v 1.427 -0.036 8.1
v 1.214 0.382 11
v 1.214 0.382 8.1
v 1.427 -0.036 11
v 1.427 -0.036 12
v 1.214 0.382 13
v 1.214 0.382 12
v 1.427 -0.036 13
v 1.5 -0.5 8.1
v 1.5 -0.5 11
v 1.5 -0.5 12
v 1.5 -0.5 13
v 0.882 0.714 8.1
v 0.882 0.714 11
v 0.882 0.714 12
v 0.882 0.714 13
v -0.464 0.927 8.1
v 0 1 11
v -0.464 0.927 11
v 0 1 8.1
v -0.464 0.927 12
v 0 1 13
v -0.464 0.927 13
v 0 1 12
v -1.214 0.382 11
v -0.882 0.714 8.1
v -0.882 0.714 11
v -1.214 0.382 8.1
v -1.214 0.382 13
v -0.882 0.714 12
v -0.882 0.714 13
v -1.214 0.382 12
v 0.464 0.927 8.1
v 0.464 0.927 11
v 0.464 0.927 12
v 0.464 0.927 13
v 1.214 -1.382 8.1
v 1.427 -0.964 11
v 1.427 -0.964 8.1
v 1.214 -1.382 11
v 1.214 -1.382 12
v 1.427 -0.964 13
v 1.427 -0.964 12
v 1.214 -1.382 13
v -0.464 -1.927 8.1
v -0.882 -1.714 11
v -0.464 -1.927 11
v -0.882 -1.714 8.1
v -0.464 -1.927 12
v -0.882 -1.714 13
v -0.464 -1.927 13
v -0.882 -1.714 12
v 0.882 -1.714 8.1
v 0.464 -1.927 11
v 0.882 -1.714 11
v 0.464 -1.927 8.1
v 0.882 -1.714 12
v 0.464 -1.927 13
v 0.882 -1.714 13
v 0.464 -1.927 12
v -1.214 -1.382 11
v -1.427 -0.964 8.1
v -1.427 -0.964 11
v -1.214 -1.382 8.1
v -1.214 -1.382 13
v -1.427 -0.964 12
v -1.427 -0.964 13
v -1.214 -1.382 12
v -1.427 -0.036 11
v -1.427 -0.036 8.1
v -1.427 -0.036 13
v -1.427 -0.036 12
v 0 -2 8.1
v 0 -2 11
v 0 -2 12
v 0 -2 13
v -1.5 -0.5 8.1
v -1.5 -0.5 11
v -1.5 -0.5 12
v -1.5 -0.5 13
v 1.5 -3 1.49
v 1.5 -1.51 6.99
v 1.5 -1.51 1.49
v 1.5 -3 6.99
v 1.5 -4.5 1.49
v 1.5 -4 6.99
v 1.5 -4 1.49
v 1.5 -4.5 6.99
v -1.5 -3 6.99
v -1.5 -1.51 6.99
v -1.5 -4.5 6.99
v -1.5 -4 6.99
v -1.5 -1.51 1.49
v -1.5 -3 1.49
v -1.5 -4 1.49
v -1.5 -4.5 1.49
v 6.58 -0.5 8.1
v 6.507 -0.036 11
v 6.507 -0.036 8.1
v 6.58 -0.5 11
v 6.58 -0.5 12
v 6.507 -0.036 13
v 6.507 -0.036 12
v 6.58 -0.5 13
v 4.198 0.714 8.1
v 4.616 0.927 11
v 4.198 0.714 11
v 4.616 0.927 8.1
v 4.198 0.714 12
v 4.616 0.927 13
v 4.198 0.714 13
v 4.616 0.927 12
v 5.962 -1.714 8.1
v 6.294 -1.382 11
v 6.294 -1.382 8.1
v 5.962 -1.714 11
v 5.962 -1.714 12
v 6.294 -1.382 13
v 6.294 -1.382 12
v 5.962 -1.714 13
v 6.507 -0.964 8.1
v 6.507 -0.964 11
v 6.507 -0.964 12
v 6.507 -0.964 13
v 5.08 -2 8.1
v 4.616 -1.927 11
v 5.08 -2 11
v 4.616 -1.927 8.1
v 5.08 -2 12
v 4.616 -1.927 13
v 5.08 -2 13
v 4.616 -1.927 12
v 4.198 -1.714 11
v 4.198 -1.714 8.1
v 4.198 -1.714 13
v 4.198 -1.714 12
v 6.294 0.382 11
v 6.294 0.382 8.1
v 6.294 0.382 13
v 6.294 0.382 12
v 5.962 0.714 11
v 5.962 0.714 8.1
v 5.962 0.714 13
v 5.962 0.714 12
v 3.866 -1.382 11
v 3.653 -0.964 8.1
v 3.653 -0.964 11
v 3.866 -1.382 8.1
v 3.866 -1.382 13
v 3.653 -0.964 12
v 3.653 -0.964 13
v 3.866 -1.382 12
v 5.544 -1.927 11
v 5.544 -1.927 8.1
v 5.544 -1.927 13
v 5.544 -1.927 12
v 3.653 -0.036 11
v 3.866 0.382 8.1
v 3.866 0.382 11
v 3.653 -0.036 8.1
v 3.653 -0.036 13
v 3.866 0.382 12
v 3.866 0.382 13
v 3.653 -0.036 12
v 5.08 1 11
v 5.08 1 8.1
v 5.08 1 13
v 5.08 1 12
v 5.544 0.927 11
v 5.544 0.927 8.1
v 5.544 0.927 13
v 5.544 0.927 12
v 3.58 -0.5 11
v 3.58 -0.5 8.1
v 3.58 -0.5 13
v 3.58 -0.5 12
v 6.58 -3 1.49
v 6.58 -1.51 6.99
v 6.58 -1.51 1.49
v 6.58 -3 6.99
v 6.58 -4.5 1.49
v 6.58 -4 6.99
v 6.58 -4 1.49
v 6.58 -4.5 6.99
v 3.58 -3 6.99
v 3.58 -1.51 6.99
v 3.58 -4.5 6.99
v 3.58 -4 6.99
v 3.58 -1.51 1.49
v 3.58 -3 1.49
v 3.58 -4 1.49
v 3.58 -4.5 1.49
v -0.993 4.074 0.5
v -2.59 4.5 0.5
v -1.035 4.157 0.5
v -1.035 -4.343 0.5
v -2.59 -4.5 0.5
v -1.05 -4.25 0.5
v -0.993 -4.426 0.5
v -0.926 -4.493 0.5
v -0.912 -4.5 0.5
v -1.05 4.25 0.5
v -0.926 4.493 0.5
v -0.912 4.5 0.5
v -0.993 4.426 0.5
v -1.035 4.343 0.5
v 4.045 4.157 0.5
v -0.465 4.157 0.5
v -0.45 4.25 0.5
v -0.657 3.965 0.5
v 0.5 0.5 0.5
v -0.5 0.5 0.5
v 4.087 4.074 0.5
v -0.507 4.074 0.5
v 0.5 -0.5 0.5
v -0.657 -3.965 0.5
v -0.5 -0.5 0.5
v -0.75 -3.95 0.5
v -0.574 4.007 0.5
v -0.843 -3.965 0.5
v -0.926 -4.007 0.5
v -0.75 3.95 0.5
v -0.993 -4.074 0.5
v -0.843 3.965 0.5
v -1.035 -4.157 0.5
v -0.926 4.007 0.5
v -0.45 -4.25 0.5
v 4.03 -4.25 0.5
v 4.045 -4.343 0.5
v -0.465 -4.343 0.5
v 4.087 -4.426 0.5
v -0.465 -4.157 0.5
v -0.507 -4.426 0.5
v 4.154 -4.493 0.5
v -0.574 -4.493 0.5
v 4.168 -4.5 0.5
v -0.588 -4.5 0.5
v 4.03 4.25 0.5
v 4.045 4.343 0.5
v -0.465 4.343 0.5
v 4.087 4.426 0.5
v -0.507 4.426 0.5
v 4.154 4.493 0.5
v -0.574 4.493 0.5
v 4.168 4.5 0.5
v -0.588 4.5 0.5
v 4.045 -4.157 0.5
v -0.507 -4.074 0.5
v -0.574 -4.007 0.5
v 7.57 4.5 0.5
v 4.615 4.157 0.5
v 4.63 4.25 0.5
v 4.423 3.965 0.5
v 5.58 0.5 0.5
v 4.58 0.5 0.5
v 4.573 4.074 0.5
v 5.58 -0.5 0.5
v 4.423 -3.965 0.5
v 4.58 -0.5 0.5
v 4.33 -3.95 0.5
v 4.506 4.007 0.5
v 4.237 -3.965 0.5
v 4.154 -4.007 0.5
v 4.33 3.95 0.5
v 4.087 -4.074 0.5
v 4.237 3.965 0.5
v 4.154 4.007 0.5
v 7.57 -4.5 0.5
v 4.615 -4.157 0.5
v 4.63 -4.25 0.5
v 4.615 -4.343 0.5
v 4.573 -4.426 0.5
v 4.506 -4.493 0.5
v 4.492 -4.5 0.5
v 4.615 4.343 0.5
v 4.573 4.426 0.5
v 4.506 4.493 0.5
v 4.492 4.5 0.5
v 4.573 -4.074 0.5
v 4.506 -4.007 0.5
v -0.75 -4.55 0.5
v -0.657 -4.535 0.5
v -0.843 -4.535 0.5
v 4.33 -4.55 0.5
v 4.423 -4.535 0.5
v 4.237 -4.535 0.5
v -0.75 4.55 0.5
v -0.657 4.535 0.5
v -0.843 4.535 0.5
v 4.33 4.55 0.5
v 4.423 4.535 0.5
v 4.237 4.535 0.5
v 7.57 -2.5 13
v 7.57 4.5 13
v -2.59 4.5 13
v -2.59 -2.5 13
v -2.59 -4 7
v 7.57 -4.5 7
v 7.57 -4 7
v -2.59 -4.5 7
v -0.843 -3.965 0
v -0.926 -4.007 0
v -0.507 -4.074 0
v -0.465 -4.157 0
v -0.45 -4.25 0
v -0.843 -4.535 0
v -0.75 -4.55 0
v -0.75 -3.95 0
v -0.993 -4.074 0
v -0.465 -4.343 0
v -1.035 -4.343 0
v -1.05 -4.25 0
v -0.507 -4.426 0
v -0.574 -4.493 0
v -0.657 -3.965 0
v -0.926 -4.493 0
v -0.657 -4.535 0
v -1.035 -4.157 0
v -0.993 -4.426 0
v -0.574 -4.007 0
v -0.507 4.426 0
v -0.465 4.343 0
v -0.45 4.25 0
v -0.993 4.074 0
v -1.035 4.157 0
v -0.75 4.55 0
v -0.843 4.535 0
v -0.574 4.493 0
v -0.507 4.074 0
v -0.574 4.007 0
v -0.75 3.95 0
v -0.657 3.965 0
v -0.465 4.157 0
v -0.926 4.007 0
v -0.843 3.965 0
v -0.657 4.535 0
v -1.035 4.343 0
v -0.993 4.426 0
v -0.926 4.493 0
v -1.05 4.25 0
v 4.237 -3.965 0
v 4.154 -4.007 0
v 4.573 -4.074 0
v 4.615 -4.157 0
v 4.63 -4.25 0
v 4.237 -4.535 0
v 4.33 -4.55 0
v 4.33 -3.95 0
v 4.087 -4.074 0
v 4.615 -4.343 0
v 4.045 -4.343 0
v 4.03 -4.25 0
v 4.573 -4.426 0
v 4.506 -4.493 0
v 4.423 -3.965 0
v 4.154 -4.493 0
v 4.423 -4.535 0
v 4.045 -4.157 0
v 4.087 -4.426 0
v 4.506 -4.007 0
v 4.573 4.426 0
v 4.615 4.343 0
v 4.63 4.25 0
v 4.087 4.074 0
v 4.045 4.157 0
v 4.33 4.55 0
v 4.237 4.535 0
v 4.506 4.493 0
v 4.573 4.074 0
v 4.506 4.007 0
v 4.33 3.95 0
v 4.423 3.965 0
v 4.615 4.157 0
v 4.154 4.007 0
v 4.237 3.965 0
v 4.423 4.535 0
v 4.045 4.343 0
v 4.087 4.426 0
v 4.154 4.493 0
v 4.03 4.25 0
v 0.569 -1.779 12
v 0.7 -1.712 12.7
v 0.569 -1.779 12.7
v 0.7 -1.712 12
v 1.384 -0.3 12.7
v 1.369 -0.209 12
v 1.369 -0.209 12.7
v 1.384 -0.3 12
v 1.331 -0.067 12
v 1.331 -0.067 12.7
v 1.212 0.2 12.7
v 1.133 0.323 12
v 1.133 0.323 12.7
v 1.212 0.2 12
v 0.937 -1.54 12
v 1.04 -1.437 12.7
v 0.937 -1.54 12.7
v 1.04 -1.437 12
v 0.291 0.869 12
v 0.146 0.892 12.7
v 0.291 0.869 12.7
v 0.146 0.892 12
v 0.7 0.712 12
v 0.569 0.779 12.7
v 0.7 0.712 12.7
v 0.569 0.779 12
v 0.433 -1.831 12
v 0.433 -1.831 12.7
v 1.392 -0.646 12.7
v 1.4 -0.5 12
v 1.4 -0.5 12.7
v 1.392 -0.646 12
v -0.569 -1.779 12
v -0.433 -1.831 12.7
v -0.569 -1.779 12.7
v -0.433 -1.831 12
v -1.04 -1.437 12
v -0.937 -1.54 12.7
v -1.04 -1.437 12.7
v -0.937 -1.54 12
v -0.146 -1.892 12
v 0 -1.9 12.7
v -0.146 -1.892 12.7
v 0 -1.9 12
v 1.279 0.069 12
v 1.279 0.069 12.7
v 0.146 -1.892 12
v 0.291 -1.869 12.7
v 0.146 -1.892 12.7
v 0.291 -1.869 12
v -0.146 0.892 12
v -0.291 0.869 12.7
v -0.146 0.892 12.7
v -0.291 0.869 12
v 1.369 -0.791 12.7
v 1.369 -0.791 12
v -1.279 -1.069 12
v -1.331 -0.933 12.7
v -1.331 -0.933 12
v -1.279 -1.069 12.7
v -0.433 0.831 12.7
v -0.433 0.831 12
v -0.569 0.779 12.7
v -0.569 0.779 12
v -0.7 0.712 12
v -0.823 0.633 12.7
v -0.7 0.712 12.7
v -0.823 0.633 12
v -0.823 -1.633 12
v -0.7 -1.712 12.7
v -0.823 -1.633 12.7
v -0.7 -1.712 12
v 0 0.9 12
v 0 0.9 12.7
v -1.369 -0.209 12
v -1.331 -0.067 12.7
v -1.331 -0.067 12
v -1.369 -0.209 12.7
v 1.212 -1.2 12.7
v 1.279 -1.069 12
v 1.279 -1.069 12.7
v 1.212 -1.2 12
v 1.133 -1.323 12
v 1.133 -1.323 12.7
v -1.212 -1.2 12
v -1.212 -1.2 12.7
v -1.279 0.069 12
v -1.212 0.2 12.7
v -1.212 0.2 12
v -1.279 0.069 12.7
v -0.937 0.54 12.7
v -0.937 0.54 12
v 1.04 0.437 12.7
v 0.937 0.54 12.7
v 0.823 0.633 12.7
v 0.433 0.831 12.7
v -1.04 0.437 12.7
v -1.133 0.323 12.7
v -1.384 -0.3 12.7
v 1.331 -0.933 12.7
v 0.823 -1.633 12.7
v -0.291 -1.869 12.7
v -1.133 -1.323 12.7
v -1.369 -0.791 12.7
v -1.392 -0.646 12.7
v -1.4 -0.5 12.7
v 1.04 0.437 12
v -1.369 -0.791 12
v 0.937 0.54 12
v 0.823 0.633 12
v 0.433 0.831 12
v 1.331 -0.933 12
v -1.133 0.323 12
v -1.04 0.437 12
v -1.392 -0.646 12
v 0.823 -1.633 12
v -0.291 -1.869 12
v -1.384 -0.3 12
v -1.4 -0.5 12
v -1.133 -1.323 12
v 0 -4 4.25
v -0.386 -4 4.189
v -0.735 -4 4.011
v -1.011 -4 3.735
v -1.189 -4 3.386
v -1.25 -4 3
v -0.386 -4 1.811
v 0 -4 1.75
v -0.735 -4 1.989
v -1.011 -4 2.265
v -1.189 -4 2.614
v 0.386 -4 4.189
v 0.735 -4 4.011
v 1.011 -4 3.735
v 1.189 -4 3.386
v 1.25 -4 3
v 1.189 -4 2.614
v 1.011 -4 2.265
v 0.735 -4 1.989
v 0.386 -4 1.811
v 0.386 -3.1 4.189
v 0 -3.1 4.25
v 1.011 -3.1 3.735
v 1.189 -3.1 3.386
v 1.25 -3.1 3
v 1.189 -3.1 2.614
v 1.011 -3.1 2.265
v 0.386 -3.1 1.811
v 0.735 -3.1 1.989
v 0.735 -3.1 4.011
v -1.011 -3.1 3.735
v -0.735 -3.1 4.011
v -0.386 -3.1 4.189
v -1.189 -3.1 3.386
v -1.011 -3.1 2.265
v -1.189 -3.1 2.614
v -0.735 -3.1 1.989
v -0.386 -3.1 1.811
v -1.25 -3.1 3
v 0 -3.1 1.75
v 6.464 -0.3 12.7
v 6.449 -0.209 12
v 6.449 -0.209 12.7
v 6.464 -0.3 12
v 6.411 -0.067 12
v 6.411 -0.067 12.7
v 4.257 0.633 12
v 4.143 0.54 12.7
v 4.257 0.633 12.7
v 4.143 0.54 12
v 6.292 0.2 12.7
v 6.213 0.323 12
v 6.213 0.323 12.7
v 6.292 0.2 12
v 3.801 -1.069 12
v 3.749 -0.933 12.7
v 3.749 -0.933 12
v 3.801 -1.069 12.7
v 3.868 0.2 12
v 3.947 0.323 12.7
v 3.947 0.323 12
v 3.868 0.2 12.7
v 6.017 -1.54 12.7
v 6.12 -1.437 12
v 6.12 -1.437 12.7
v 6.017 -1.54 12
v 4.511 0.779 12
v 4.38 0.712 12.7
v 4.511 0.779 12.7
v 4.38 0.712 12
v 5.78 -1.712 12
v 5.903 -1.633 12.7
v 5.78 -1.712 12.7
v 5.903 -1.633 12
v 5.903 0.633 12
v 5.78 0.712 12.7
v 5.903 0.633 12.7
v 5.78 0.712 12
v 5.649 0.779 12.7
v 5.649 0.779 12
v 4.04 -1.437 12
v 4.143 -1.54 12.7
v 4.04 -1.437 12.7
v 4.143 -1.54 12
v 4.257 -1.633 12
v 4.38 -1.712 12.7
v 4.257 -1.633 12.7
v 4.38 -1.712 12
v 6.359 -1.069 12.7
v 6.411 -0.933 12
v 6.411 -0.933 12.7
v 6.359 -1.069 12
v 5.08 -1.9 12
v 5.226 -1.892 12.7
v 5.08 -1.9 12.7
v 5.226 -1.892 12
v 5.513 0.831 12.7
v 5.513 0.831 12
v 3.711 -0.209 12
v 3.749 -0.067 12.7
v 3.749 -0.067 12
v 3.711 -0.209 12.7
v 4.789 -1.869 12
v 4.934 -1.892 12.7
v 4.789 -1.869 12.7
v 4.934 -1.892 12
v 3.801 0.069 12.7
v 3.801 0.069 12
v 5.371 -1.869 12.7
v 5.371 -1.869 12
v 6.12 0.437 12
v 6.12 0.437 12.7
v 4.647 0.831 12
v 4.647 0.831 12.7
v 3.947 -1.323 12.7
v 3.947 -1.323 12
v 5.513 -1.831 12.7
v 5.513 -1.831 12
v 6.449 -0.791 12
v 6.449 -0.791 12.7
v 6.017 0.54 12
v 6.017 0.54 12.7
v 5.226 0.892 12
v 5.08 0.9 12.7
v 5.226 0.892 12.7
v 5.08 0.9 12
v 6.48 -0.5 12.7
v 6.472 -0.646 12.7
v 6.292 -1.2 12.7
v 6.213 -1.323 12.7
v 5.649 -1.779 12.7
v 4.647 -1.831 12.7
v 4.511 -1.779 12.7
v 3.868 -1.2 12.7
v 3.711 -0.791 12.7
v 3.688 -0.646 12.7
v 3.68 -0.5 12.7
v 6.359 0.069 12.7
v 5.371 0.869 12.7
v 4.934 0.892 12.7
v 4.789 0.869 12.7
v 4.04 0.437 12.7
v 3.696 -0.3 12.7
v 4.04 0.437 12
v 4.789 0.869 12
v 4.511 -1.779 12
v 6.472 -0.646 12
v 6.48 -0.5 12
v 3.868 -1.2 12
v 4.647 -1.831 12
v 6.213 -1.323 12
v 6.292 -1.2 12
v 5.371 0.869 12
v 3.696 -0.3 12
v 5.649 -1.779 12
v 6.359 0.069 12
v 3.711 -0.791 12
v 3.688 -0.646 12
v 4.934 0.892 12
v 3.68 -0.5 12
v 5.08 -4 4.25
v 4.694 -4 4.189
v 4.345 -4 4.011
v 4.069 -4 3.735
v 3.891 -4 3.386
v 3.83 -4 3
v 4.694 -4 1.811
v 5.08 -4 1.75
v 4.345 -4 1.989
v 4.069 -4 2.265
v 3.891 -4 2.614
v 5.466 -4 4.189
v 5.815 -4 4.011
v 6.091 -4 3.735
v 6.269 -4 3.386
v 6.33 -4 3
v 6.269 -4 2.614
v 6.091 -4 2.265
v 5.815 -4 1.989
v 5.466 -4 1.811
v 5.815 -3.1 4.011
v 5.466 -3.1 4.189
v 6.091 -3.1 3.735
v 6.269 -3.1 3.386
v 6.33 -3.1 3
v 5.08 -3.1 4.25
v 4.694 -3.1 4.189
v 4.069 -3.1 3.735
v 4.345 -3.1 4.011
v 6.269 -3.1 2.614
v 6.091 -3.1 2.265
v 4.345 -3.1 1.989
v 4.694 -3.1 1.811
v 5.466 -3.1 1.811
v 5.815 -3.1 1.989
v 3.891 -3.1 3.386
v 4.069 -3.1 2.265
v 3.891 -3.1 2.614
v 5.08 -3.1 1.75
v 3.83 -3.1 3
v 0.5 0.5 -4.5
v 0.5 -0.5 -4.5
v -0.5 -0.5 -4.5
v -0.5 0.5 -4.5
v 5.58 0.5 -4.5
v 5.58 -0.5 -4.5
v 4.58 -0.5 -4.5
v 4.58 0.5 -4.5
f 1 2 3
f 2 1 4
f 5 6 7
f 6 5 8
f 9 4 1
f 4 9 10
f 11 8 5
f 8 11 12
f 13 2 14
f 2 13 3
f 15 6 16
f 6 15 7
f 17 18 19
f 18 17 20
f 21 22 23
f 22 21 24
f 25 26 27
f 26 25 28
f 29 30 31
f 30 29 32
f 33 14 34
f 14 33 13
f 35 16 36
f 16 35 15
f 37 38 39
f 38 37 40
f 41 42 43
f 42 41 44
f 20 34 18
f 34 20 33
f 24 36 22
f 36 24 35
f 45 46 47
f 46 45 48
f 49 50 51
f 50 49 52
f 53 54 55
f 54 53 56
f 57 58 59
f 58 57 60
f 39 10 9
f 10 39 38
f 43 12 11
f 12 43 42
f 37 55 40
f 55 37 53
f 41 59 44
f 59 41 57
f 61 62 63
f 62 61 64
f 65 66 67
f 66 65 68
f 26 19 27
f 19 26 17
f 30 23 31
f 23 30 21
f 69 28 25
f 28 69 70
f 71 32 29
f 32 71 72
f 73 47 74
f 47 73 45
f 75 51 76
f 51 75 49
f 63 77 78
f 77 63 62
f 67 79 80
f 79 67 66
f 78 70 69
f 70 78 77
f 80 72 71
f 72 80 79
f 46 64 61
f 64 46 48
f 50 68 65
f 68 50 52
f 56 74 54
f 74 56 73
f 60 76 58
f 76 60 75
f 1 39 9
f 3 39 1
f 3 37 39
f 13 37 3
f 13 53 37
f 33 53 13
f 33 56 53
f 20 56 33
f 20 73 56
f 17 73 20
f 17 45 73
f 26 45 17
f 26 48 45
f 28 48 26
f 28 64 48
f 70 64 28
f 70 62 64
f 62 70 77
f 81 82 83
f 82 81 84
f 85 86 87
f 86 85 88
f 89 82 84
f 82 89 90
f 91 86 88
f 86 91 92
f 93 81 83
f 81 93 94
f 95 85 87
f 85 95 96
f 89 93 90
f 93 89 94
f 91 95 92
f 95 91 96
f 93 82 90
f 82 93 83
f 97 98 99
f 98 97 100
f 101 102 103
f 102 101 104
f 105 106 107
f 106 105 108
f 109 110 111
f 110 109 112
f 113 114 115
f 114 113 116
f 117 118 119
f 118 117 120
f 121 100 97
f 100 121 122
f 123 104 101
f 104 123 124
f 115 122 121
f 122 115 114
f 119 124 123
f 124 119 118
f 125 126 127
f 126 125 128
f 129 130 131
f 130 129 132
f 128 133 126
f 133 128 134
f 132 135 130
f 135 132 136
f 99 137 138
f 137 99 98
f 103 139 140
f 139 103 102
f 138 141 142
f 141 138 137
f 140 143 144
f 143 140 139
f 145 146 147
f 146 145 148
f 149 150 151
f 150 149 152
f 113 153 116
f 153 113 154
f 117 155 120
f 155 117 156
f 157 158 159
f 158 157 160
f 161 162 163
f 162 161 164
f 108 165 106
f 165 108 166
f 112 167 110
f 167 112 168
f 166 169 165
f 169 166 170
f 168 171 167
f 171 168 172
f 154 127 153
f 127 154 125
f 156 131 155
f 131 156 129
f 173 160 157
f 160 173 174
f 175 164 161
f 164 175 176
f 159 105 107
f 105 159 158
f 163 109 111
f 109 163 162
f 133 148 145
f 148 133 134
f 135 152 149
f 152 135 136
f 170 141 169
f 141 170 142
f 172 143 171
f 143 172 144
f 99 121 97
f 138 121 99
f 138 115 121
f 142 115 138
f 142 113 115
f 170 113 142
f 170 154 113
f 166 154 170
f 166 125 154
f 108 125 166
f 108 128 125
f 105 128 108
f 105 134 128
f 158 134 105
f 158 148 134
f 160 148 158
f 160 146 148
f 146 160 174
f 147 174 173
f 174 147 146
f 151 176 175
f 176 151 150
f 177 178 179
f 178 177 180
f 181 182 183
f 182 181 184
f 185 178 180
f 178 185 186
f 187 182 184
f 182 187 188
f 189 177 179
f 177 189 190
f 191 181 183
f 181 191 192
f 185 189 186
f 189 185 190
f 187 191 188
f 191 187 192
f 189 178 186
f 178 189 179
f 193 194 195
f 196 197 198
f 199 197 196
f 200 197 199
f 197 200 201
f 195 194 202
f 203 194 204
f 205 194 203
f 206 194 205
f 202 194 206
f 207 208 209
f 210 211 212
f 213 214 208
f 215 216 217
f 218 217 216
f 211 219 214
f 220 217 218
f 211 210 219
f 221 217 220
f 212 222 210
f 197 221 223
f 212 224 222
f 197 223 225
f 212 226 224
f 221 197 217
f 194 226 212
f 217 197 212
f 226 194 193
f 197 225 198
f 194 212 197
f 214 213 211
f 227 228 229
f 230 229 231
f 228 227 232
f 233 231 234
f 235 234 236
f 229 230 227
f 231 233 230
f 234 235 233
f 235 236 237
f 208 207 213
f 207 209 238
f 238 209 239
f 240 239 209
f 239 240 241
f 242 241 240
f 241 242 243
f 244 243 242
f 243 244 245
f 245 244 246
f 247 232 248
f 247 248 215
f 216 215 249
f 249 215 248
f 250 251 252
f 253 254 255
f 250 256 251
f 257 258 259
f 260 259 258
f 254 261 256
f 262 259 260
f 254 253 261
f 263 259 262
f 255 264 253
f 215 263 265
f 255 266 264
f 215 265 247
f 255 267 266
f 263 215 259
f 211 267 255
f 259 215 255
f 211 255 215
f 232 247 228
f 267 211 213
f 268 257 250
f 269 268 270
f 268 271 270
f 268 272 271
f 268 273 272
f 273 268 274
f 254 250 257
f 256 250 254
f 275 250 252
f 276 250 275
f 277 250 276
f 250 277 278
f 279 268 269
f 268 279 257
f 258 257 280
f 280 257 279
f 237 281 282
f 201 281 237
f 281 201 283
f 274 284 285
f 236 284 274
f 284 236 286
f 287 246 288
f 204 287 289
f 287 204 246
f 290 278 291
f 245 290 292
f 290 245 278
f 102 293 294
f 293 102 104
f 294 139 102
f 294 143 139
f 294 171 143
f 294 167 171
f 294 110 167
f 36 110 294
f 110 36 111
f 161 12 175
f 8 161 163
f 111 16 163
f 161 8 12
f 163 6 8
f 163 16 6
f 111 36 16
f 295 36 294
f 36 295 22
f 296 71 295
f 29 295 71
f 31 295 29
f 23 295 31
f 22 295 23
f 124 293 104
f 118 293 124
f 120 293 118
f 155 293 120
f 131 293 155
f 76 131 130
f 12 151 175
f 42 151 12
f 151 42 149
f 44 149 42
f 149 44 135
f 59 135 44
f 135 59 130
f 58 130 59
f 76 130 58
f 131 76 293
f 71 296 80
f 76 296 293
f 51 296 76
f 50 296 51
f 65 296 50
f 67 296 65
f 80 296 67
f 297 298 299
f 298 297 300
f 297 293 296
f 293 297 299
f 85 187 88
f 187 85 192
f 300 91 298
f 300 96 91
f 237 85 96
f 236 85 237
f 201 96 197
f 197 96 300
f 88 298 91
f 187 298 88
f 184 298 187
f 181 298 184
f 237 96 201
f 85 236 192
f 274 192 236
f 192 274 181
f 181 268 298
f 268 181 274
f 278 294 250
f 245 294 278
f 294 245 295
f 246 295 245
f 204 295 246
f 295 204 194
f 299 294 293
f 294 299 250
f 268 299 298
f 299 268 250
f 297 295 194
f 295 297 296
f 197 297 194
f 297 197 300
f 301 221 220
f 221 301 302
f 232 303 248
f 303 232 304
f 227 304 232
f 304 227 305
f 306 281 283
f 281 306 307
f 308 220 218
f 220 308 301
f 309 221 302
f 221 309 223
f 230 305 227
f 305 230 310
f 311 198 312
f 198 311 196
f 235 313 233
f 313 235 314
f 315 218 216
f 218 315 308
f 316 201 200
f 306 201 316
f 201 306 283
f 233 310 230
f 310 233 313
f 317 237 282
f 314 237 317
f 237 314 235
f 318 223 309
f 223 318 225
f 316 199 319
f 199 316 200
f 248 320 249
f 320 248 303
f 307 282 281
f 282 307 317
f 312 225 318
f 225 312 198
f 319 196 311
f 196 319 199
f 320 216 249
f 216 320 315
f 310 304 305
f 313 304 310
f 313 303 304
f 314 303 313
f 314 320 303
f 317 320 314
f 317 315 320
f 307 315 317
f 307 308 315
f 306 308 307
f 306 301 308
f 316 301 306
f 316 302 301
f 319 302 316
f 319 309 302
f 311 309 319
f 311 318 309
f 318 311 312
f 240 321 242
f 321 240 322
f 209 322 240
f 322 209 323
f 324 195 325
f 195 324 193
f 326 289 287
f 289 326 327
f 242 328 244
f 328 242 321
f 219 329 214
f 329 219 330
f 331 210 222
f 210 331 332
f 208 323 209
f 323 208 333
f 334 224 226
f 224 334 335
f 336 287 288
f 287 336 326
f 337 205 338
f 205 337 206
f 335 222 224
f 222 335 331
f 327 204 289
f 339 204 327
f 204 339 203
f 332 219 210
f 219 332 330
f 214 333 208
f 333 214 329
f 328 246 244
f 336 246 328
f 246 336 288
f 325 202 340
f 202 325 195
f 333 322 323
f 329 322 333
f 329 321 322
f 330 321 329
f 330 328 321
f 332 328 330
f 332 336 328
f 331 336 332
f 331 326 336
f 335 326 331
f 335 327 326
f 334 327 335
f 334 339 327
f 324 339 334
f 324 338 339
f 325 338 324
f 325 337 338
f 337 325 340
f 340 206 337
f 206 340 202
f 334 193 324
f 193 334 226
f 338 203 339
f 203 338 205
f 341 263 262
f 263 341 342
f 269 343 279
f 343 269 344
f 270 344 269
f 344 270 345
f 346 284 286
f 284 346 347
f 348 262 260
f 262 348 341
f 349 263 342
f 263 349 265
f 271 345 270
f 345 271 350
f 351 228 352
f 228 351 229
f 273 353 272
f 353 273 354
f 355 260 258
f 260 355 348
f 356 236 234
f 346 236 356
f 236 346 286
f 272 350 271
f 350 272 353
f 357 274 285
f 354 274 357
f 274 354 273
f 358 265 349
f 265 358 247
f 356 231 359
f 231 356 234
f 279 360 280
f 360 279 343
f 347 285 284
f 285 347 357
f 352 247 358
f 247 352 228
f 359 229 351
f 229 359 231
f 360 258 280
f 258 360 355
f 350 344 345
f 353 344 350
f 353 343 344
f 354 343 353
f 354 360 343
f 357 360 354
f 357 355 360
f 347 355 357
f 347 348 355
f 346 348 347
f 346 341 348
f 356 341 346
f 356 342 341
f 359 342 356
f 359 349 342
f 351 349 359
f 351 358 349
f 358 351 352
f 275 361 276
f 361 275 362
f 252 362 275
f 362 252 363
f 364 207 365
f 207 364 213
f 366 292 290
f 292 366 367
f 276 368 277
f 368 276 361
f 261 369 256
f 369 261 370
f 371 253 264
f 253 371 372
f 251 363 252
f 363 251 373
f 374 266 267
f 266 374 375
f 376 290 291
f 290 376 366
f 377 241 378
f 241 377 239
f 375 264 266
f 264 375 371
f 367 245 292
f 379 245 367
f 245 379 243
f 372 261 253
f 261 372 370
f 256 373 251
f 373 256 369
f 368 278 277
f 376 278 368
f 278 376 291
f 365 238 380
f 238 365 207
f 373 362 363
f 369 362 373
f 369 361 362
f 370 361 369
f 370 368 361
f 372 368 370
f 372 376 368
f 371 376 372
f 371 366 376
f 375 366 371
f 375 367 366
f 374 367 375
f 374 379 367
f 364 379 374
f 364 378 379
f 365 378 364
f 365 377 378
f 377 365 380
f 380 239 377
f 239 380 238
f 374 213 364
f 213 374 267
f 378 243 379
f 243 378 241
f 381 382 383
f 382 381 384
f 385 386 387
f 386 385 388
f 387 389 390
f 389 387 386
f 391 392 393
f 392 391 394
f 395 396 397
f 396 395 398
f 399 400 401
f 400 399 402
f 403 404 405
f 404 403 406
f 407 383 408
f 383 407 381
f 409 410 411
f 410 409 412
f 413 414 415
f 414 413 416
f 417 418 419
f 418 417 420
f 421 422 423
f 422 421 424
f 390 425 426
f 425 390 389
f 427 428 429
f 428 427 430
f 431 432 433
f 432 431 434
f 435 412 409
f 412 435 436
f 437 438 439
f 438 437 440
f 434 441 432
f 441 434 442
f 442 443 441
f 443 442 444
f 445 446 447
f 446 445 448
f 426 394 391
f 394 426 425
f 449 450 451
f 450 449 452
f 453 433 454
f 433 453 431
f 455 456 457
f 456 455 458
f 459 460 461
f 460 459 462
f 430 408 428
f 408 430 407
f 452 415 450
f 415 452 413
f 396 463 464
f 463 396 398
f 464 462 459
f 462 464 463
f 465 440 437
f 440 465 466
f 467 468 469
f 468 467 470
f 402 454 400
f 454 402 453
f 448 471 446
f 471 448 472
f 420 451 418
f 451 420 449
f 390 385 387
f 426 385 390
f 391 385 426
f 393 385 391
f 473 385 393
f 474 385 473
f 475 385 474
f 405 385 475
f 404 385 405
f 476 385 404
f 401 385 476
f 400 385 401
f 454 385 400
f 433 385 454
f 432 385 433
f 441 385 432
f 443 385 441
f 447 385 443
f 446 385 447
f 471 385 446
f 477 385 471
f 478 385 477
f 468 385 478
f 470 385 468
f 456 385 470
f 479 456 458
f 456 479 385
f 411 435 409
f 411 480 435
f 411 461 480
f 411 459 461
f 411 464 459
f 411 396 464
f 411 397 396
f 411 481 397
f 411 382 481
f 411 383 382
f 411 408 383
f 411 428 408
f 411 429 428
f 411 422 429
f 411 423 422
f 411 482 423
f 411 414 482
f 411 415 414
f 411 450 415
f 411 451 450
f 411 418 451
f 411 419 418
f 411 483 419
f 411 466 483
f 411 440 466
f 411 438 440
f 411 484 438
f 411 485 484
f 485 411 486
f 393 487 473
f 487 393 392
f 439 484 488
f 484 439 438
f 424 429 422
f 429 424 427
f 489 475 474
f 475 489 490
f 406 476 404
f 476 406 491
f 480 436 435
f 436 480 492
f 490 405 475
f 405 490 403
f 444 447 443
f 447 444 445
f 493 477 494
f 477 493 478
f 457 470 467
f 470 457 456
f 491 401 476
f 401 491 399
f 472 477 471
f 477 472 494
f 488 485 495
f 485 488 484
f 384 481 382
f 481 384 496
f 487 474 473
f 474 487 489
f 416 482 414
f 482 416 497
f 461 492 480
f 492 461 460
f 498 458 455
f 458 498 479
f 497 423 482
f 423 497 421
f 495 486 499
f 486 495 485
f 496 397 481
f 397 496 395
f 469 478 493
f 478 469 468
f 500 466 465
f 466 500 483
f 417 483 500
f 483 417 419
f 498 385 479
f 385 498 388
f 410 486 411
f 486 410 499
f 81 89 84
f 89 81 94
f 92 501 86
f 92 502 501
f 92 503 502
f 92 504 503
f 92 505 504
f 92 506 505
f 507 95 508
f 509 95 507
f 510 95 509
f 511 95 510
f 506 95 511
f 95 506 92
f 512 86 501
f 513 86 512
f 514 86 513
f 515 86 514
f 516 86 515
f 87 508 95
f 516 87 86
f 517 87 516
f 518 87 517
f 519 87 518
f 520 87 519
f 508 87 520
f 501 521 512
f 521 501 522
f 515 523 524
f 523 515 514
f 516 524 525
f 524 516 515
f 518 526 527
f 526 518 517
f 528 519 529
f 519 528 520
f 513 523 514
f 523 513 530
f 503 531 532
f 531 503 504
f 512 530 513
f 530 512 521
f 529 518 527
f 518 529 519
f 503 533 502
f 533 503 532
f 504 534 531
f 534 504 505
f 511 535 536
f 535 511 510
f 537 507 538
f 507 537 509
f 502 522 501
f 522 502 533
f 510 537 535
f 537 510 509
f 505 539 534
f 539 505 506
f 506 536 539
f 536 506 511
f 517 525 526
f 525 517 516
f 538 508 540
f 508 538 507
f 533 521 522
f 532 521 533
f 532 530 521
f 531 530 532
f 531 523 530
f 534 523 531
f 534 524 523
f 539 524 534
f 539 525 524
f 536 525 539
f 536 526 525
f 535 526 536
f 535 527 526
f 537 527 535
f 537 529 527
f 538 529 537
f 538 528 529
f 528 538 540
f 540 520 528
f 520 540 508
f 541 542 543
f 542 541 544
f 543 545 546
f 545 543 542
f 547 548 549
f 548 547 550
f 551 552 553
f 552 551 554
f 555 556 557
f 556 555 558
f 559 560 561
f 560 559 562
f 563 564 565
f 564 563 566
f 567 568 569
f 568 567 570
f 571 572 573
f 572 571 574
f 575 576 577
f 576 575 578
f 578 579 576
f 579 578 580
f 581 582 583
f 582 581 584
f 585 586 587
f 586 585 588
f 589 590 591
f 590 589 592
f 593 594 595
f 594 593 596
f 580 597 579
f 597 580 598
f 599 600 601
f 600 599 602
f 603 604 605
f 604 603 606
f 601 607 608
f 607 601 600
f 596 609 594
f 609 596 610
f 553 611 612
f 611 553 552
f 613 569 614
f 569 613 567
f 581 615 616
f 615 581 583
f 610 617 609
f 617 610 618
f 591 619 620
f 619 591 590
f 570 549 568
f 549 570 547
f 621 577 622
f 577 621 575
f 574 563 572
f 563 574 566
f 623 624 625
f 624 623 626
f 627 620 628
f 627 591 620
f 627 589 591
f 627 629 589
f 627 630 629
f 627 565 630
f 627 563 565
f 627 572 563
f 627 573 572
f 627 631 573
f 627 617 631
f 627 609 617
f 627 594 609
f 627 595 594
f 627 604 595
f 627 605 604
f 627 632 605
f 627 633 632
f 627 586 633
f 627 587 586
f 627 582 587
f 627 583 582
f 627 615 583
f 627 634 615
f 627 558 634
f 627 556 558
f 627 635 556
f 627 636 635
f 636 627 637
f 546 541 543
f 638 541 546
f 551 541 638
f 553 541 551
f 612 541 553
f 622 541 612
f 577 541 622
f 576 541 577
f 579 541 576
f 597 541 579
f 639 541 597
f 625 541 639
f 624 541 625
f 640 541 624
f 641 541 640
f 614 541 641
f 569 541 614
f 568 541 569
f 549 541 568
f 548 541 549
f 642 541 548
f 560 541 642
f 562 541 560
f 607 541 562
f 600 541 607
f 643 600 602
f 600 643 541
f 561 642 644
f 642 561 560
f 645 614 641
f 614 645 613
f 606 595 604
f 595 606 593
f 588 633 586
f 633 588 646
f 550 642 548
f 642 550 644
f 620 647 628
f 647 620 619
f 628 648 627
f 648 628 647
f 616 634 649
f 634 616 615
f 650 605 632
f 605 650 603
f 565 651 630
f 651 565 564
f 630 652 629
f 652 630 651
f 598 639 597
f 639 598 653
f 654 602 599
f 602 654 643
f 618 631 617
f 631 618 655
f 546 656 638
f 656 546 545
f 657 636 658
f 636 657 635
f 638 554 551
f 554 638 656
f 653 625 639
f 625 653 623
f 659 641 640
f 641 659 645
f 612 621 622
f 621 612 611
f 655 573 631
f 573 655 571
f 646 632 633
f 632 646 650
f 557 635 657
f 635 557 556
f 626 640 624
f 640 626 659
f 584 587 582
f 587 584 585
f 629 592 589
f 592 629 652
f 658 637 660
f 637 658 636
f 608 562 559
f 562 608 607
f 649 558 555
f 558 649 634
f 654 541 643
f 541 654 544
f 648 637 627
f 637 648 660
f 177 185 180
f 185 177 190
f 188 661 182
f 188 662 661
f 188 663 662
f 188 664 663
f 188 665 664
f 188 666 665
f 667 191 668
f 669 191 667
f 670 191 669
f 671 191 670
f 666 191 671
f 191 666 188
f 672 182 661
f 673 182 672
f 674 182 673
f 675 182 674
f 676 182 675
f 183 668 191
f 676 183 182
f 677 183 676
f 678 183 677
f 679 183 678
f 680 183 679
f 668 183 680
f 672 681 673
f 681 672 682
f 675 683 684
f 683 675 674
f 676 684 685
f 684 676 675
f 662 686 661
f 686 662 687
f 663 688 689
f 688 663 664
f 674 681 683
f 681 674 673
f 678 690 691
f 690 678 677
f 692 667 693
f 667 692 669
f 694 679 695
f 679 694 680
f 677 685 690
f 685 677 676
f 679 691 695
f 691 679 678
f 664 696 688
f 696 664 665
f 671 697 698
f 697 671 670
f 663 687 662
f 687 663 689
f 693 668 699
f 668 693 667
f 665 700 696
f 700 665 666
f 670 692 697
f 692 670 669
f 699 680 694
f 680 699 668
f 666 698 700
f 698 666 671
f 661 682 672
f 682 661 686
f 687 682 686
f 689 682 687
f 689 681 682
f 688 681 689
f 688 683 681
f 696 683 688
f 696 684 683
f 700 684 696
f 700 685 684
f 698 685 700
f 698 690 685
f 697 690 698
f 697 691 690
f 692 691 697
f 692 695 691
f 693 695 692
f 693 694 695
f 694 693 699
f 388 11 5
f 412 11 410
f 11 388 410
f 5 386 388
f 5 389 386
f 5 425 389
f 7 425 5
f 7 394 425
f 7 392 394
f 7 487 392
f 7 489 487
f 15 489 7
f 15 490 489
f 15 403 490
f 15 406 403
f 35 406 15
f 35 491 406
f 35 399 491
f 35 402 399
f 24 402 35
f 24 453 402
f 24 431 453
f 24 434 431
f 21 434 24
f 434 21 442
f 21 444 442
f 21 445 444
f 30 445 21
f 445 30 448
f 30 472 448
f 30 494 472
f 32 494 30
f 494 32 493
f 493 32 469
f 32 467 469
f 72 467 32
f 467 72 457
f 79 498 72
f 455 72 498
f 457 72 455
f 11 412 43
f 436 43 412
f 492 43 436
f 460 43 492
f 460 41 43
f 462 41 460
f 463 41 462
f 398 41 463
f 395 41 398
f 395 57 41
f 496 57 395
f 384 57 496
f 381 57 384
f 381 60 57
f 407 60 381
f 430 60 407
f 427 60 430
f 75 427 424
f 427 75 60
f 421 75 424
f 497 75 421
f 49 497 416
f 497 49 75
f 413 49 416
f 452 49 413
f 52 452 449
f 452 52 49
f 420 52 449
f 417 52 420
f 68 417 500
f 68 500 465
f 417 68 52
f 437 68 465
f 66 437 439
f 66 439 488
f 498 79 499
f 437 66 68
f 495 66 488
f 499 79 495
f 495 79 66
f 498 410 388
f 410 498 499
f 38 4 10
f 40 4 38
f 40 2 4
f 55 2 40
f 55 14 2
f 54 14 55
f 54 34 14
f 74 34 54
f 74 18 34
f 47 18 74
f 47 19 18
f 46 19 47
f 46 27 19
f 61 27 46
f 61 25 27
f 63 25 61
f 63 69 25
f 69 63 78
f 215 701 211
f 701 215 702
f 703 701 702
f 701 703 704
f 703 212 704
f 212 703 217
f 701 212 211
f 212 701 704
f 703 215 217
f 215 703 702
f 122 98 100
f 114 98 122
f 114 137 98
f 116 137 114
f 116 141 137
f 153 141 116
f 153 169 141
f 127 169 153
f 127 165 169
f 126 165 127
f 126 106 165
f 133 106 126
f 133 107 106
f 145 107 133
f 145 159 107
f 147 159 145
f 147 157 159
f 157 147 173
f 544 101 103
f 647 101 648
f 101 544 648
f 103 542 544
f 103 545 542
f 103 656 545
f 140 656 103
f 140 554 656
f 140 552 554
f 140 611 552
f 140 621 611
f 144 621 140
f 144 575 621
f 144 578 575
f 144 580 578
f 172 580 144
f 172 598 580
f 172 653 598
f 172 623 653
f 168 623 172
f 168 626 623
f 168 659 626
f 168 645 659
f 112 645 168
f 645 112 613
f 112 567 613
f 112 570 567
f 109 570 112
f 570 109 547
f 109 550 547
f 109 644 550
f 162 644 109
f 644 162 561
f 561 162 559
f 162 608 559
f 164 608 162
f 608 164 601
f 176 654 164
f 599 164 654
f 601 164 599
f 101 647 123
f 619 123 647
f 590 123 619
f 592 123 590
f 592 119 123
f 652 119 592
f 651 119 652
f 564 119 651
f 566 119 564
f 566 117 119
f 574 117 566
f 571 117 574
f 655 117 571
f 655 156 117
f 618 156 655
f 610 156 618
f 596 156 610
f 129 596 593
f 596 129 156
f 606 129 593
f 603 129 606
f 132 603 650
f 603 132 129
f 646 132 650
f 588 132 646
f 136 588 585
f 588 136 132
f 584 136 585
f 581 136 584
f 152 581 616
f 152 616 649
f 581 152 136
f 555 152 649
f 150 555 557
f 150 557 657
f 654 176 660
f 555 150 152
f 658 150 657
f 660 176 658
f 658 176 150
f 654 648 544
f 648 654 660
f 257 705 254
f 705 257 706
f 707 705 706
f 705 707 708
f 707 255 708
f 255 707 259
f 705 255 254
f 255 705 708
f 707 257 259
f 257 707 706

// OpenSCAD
// On Shore OSTTA series 2 position terminal block

np=2; // number of terminals
dp=5.08; // spacing between pins
sd=3; // screw diameter
wd=2.5; // wire hole diameter
pkgColor="#005D9C";

module body() {    
    difference() {
    // the main body
    color(pkgColor)
    polyhedron( 
    points = [
    // bottom plane
    [ 0.7,         0,   0.5 ], // 0
    [ 0.7,         9,   0.5 ], // 1
    [ 0.7+(np*dp), 9,   0.5 ], // 2
    [ 0.7+(np*dp), 0,   0.5 ], // 3

    // top plane
    [ 0.7,         9,   13 ], // 4
    [ 0.7+(np*dp), 9,   13 ], // 5
    [ 0.7+(np*dp), 2,   13 ], // 6
    [ 0.7,         2,   13 ], // 7

    // the mid kneel point
    [ 0.7,         0,   7 ], // 8
    [ 0.7,         0.5, 7 ], // 9
    [ 0.7+(np*dp), 0.5, 7 ], // 10
    [ 0.7+(np*dp), 0,   7 ], // 11
    ],
    faces = [
    [0, 3, 2, 1 ], // bottom face
    [4, 5, 6, 7 ], // top face
    [8, 9, 10,11], // mid kneel point
    [9, 7, 6, 10], // front angle part
    [0, 8, 11,3 ], // front vertical
    [4, 1, 2, 5 ], // back vertical
    [6, 5, 2, 3, 11, 10 ], // right side
    [4, 7, 9, 8, 0, 1 ]
    ]);

    // the recessed triangle thing on the right
    color(pkgColor)
    polyhedron([
    [(np*dp)+0.3,      7.5, 0.49 ], // 0
    [(np*dp)+0.3,      8.5, 0.49 ], // 1
    [(np*dp)+0.3+0.75, 8,   0.49 ], // 2
    [(np*dp)+0.3,      7.5, 7   ],  // 3
    [(np*dp)+0.3,      8.5, 7   ],  // 4
    [(np*dp)+0.3+0.75, 8,   7   ],  // 5
    ],
    [
    [1, 0, 2 ],
    [3, 4, 5 ],
    [4, 3, 0, 1 ],
    [3, 5, 2, 0 ],
    [4, 5, 2, 1 ]
    ]);

      // the holes for the screws and the front screw terminal places
      for (a =[1:np]) {
        c = (a == 1) ? dp/2 : (a-1)*dp + dp/2;
        translate([0.75+c, 4, 8.1]) 
           color(pkgColor) cylinder( h=5, r=(sd/2), $fn=20);
        
        translate([0.75+c-(sd/2), -0.01, 1.49]) 
           color(pkgColor) cube([ 3, 3, 5.5 ]);  
      } // for

    }

    // bumps on the bottom
    
    for (a =[1:np]) {
      c = (a == 1) ? dp/2 : (a-1)*dp + dp/2;
      translate([c, 0.25, 0]) 
            color(pkgColor) cylinder( h=0.5, r=0.3, $fn=20);
      translate([c, 8.75, 0]) 
            color(pkgColor) cylinder( h=0.5, r=0.3, $fn=20);
    }
      
      
    // the triangle thing on the left
    color(pkgColor)
    polyhedron([
    [0,    7.5, 0.5 ], // 0
    [0,    8.5, 0.5 ], // 1
    [0.75, 8,   0.5 ], // 2
    [0,    7.5, 7   ], // 3
    [0,    8.5, 7   ], // 4
    [0.75, 8,   7   ], // 5
    ],
    [
    [1, 0, 2 ],
    [3, 4, 5 ],
    [4, 3, 0, 1 ],
    [3, 5, 2, 0 ],
    [4, 5, 2, 1 ]
    ]);
}

module terminals() {
for (a =[1:np]) {
    c = (a == 1) ? dp/2 : (a-1)*dp + dp/2;
    
    // the screws on the top
    translate([0.75+c, 4, 11.0]) 
        color("#C0C0C0")cylinder( h=1, r=(sd/2), $fn=60);
    
    difference() {
    translate([0.75+c, 4, 11.7]) 
        color("#C0C0C0") cylinder( h=1, r=1.4, $fn=60);
    translate([0.75+c-(sd/2), 4, 11.8]) 
        color("#C0C0C0") cube([sd, 0.2, (sd/2)]);
    }
    
    // the metal front pieces
    difference() {
    translate([0.75+c-(sd/2), 0.5, 0.99]) 
        color("#C0C0C0") cube([ sd, 1, 6 ]);
    translate([0.75+c, 1.4, 3]) rotate([90,0,0]) 
        color("#C0C0C0") cylinder(r=wd/2, h=1.3, $fn=20);
    }
    
    translate([0.75+c-0.5,4,-4.5])
        color("#C0C0C0") cube([1,1,5]);
  } // for
}

translate([-(0.75+dp/2),-(4+0.5),0]) // have pin 1 over the origin.
union() {
  body();
  terminals();
}   
